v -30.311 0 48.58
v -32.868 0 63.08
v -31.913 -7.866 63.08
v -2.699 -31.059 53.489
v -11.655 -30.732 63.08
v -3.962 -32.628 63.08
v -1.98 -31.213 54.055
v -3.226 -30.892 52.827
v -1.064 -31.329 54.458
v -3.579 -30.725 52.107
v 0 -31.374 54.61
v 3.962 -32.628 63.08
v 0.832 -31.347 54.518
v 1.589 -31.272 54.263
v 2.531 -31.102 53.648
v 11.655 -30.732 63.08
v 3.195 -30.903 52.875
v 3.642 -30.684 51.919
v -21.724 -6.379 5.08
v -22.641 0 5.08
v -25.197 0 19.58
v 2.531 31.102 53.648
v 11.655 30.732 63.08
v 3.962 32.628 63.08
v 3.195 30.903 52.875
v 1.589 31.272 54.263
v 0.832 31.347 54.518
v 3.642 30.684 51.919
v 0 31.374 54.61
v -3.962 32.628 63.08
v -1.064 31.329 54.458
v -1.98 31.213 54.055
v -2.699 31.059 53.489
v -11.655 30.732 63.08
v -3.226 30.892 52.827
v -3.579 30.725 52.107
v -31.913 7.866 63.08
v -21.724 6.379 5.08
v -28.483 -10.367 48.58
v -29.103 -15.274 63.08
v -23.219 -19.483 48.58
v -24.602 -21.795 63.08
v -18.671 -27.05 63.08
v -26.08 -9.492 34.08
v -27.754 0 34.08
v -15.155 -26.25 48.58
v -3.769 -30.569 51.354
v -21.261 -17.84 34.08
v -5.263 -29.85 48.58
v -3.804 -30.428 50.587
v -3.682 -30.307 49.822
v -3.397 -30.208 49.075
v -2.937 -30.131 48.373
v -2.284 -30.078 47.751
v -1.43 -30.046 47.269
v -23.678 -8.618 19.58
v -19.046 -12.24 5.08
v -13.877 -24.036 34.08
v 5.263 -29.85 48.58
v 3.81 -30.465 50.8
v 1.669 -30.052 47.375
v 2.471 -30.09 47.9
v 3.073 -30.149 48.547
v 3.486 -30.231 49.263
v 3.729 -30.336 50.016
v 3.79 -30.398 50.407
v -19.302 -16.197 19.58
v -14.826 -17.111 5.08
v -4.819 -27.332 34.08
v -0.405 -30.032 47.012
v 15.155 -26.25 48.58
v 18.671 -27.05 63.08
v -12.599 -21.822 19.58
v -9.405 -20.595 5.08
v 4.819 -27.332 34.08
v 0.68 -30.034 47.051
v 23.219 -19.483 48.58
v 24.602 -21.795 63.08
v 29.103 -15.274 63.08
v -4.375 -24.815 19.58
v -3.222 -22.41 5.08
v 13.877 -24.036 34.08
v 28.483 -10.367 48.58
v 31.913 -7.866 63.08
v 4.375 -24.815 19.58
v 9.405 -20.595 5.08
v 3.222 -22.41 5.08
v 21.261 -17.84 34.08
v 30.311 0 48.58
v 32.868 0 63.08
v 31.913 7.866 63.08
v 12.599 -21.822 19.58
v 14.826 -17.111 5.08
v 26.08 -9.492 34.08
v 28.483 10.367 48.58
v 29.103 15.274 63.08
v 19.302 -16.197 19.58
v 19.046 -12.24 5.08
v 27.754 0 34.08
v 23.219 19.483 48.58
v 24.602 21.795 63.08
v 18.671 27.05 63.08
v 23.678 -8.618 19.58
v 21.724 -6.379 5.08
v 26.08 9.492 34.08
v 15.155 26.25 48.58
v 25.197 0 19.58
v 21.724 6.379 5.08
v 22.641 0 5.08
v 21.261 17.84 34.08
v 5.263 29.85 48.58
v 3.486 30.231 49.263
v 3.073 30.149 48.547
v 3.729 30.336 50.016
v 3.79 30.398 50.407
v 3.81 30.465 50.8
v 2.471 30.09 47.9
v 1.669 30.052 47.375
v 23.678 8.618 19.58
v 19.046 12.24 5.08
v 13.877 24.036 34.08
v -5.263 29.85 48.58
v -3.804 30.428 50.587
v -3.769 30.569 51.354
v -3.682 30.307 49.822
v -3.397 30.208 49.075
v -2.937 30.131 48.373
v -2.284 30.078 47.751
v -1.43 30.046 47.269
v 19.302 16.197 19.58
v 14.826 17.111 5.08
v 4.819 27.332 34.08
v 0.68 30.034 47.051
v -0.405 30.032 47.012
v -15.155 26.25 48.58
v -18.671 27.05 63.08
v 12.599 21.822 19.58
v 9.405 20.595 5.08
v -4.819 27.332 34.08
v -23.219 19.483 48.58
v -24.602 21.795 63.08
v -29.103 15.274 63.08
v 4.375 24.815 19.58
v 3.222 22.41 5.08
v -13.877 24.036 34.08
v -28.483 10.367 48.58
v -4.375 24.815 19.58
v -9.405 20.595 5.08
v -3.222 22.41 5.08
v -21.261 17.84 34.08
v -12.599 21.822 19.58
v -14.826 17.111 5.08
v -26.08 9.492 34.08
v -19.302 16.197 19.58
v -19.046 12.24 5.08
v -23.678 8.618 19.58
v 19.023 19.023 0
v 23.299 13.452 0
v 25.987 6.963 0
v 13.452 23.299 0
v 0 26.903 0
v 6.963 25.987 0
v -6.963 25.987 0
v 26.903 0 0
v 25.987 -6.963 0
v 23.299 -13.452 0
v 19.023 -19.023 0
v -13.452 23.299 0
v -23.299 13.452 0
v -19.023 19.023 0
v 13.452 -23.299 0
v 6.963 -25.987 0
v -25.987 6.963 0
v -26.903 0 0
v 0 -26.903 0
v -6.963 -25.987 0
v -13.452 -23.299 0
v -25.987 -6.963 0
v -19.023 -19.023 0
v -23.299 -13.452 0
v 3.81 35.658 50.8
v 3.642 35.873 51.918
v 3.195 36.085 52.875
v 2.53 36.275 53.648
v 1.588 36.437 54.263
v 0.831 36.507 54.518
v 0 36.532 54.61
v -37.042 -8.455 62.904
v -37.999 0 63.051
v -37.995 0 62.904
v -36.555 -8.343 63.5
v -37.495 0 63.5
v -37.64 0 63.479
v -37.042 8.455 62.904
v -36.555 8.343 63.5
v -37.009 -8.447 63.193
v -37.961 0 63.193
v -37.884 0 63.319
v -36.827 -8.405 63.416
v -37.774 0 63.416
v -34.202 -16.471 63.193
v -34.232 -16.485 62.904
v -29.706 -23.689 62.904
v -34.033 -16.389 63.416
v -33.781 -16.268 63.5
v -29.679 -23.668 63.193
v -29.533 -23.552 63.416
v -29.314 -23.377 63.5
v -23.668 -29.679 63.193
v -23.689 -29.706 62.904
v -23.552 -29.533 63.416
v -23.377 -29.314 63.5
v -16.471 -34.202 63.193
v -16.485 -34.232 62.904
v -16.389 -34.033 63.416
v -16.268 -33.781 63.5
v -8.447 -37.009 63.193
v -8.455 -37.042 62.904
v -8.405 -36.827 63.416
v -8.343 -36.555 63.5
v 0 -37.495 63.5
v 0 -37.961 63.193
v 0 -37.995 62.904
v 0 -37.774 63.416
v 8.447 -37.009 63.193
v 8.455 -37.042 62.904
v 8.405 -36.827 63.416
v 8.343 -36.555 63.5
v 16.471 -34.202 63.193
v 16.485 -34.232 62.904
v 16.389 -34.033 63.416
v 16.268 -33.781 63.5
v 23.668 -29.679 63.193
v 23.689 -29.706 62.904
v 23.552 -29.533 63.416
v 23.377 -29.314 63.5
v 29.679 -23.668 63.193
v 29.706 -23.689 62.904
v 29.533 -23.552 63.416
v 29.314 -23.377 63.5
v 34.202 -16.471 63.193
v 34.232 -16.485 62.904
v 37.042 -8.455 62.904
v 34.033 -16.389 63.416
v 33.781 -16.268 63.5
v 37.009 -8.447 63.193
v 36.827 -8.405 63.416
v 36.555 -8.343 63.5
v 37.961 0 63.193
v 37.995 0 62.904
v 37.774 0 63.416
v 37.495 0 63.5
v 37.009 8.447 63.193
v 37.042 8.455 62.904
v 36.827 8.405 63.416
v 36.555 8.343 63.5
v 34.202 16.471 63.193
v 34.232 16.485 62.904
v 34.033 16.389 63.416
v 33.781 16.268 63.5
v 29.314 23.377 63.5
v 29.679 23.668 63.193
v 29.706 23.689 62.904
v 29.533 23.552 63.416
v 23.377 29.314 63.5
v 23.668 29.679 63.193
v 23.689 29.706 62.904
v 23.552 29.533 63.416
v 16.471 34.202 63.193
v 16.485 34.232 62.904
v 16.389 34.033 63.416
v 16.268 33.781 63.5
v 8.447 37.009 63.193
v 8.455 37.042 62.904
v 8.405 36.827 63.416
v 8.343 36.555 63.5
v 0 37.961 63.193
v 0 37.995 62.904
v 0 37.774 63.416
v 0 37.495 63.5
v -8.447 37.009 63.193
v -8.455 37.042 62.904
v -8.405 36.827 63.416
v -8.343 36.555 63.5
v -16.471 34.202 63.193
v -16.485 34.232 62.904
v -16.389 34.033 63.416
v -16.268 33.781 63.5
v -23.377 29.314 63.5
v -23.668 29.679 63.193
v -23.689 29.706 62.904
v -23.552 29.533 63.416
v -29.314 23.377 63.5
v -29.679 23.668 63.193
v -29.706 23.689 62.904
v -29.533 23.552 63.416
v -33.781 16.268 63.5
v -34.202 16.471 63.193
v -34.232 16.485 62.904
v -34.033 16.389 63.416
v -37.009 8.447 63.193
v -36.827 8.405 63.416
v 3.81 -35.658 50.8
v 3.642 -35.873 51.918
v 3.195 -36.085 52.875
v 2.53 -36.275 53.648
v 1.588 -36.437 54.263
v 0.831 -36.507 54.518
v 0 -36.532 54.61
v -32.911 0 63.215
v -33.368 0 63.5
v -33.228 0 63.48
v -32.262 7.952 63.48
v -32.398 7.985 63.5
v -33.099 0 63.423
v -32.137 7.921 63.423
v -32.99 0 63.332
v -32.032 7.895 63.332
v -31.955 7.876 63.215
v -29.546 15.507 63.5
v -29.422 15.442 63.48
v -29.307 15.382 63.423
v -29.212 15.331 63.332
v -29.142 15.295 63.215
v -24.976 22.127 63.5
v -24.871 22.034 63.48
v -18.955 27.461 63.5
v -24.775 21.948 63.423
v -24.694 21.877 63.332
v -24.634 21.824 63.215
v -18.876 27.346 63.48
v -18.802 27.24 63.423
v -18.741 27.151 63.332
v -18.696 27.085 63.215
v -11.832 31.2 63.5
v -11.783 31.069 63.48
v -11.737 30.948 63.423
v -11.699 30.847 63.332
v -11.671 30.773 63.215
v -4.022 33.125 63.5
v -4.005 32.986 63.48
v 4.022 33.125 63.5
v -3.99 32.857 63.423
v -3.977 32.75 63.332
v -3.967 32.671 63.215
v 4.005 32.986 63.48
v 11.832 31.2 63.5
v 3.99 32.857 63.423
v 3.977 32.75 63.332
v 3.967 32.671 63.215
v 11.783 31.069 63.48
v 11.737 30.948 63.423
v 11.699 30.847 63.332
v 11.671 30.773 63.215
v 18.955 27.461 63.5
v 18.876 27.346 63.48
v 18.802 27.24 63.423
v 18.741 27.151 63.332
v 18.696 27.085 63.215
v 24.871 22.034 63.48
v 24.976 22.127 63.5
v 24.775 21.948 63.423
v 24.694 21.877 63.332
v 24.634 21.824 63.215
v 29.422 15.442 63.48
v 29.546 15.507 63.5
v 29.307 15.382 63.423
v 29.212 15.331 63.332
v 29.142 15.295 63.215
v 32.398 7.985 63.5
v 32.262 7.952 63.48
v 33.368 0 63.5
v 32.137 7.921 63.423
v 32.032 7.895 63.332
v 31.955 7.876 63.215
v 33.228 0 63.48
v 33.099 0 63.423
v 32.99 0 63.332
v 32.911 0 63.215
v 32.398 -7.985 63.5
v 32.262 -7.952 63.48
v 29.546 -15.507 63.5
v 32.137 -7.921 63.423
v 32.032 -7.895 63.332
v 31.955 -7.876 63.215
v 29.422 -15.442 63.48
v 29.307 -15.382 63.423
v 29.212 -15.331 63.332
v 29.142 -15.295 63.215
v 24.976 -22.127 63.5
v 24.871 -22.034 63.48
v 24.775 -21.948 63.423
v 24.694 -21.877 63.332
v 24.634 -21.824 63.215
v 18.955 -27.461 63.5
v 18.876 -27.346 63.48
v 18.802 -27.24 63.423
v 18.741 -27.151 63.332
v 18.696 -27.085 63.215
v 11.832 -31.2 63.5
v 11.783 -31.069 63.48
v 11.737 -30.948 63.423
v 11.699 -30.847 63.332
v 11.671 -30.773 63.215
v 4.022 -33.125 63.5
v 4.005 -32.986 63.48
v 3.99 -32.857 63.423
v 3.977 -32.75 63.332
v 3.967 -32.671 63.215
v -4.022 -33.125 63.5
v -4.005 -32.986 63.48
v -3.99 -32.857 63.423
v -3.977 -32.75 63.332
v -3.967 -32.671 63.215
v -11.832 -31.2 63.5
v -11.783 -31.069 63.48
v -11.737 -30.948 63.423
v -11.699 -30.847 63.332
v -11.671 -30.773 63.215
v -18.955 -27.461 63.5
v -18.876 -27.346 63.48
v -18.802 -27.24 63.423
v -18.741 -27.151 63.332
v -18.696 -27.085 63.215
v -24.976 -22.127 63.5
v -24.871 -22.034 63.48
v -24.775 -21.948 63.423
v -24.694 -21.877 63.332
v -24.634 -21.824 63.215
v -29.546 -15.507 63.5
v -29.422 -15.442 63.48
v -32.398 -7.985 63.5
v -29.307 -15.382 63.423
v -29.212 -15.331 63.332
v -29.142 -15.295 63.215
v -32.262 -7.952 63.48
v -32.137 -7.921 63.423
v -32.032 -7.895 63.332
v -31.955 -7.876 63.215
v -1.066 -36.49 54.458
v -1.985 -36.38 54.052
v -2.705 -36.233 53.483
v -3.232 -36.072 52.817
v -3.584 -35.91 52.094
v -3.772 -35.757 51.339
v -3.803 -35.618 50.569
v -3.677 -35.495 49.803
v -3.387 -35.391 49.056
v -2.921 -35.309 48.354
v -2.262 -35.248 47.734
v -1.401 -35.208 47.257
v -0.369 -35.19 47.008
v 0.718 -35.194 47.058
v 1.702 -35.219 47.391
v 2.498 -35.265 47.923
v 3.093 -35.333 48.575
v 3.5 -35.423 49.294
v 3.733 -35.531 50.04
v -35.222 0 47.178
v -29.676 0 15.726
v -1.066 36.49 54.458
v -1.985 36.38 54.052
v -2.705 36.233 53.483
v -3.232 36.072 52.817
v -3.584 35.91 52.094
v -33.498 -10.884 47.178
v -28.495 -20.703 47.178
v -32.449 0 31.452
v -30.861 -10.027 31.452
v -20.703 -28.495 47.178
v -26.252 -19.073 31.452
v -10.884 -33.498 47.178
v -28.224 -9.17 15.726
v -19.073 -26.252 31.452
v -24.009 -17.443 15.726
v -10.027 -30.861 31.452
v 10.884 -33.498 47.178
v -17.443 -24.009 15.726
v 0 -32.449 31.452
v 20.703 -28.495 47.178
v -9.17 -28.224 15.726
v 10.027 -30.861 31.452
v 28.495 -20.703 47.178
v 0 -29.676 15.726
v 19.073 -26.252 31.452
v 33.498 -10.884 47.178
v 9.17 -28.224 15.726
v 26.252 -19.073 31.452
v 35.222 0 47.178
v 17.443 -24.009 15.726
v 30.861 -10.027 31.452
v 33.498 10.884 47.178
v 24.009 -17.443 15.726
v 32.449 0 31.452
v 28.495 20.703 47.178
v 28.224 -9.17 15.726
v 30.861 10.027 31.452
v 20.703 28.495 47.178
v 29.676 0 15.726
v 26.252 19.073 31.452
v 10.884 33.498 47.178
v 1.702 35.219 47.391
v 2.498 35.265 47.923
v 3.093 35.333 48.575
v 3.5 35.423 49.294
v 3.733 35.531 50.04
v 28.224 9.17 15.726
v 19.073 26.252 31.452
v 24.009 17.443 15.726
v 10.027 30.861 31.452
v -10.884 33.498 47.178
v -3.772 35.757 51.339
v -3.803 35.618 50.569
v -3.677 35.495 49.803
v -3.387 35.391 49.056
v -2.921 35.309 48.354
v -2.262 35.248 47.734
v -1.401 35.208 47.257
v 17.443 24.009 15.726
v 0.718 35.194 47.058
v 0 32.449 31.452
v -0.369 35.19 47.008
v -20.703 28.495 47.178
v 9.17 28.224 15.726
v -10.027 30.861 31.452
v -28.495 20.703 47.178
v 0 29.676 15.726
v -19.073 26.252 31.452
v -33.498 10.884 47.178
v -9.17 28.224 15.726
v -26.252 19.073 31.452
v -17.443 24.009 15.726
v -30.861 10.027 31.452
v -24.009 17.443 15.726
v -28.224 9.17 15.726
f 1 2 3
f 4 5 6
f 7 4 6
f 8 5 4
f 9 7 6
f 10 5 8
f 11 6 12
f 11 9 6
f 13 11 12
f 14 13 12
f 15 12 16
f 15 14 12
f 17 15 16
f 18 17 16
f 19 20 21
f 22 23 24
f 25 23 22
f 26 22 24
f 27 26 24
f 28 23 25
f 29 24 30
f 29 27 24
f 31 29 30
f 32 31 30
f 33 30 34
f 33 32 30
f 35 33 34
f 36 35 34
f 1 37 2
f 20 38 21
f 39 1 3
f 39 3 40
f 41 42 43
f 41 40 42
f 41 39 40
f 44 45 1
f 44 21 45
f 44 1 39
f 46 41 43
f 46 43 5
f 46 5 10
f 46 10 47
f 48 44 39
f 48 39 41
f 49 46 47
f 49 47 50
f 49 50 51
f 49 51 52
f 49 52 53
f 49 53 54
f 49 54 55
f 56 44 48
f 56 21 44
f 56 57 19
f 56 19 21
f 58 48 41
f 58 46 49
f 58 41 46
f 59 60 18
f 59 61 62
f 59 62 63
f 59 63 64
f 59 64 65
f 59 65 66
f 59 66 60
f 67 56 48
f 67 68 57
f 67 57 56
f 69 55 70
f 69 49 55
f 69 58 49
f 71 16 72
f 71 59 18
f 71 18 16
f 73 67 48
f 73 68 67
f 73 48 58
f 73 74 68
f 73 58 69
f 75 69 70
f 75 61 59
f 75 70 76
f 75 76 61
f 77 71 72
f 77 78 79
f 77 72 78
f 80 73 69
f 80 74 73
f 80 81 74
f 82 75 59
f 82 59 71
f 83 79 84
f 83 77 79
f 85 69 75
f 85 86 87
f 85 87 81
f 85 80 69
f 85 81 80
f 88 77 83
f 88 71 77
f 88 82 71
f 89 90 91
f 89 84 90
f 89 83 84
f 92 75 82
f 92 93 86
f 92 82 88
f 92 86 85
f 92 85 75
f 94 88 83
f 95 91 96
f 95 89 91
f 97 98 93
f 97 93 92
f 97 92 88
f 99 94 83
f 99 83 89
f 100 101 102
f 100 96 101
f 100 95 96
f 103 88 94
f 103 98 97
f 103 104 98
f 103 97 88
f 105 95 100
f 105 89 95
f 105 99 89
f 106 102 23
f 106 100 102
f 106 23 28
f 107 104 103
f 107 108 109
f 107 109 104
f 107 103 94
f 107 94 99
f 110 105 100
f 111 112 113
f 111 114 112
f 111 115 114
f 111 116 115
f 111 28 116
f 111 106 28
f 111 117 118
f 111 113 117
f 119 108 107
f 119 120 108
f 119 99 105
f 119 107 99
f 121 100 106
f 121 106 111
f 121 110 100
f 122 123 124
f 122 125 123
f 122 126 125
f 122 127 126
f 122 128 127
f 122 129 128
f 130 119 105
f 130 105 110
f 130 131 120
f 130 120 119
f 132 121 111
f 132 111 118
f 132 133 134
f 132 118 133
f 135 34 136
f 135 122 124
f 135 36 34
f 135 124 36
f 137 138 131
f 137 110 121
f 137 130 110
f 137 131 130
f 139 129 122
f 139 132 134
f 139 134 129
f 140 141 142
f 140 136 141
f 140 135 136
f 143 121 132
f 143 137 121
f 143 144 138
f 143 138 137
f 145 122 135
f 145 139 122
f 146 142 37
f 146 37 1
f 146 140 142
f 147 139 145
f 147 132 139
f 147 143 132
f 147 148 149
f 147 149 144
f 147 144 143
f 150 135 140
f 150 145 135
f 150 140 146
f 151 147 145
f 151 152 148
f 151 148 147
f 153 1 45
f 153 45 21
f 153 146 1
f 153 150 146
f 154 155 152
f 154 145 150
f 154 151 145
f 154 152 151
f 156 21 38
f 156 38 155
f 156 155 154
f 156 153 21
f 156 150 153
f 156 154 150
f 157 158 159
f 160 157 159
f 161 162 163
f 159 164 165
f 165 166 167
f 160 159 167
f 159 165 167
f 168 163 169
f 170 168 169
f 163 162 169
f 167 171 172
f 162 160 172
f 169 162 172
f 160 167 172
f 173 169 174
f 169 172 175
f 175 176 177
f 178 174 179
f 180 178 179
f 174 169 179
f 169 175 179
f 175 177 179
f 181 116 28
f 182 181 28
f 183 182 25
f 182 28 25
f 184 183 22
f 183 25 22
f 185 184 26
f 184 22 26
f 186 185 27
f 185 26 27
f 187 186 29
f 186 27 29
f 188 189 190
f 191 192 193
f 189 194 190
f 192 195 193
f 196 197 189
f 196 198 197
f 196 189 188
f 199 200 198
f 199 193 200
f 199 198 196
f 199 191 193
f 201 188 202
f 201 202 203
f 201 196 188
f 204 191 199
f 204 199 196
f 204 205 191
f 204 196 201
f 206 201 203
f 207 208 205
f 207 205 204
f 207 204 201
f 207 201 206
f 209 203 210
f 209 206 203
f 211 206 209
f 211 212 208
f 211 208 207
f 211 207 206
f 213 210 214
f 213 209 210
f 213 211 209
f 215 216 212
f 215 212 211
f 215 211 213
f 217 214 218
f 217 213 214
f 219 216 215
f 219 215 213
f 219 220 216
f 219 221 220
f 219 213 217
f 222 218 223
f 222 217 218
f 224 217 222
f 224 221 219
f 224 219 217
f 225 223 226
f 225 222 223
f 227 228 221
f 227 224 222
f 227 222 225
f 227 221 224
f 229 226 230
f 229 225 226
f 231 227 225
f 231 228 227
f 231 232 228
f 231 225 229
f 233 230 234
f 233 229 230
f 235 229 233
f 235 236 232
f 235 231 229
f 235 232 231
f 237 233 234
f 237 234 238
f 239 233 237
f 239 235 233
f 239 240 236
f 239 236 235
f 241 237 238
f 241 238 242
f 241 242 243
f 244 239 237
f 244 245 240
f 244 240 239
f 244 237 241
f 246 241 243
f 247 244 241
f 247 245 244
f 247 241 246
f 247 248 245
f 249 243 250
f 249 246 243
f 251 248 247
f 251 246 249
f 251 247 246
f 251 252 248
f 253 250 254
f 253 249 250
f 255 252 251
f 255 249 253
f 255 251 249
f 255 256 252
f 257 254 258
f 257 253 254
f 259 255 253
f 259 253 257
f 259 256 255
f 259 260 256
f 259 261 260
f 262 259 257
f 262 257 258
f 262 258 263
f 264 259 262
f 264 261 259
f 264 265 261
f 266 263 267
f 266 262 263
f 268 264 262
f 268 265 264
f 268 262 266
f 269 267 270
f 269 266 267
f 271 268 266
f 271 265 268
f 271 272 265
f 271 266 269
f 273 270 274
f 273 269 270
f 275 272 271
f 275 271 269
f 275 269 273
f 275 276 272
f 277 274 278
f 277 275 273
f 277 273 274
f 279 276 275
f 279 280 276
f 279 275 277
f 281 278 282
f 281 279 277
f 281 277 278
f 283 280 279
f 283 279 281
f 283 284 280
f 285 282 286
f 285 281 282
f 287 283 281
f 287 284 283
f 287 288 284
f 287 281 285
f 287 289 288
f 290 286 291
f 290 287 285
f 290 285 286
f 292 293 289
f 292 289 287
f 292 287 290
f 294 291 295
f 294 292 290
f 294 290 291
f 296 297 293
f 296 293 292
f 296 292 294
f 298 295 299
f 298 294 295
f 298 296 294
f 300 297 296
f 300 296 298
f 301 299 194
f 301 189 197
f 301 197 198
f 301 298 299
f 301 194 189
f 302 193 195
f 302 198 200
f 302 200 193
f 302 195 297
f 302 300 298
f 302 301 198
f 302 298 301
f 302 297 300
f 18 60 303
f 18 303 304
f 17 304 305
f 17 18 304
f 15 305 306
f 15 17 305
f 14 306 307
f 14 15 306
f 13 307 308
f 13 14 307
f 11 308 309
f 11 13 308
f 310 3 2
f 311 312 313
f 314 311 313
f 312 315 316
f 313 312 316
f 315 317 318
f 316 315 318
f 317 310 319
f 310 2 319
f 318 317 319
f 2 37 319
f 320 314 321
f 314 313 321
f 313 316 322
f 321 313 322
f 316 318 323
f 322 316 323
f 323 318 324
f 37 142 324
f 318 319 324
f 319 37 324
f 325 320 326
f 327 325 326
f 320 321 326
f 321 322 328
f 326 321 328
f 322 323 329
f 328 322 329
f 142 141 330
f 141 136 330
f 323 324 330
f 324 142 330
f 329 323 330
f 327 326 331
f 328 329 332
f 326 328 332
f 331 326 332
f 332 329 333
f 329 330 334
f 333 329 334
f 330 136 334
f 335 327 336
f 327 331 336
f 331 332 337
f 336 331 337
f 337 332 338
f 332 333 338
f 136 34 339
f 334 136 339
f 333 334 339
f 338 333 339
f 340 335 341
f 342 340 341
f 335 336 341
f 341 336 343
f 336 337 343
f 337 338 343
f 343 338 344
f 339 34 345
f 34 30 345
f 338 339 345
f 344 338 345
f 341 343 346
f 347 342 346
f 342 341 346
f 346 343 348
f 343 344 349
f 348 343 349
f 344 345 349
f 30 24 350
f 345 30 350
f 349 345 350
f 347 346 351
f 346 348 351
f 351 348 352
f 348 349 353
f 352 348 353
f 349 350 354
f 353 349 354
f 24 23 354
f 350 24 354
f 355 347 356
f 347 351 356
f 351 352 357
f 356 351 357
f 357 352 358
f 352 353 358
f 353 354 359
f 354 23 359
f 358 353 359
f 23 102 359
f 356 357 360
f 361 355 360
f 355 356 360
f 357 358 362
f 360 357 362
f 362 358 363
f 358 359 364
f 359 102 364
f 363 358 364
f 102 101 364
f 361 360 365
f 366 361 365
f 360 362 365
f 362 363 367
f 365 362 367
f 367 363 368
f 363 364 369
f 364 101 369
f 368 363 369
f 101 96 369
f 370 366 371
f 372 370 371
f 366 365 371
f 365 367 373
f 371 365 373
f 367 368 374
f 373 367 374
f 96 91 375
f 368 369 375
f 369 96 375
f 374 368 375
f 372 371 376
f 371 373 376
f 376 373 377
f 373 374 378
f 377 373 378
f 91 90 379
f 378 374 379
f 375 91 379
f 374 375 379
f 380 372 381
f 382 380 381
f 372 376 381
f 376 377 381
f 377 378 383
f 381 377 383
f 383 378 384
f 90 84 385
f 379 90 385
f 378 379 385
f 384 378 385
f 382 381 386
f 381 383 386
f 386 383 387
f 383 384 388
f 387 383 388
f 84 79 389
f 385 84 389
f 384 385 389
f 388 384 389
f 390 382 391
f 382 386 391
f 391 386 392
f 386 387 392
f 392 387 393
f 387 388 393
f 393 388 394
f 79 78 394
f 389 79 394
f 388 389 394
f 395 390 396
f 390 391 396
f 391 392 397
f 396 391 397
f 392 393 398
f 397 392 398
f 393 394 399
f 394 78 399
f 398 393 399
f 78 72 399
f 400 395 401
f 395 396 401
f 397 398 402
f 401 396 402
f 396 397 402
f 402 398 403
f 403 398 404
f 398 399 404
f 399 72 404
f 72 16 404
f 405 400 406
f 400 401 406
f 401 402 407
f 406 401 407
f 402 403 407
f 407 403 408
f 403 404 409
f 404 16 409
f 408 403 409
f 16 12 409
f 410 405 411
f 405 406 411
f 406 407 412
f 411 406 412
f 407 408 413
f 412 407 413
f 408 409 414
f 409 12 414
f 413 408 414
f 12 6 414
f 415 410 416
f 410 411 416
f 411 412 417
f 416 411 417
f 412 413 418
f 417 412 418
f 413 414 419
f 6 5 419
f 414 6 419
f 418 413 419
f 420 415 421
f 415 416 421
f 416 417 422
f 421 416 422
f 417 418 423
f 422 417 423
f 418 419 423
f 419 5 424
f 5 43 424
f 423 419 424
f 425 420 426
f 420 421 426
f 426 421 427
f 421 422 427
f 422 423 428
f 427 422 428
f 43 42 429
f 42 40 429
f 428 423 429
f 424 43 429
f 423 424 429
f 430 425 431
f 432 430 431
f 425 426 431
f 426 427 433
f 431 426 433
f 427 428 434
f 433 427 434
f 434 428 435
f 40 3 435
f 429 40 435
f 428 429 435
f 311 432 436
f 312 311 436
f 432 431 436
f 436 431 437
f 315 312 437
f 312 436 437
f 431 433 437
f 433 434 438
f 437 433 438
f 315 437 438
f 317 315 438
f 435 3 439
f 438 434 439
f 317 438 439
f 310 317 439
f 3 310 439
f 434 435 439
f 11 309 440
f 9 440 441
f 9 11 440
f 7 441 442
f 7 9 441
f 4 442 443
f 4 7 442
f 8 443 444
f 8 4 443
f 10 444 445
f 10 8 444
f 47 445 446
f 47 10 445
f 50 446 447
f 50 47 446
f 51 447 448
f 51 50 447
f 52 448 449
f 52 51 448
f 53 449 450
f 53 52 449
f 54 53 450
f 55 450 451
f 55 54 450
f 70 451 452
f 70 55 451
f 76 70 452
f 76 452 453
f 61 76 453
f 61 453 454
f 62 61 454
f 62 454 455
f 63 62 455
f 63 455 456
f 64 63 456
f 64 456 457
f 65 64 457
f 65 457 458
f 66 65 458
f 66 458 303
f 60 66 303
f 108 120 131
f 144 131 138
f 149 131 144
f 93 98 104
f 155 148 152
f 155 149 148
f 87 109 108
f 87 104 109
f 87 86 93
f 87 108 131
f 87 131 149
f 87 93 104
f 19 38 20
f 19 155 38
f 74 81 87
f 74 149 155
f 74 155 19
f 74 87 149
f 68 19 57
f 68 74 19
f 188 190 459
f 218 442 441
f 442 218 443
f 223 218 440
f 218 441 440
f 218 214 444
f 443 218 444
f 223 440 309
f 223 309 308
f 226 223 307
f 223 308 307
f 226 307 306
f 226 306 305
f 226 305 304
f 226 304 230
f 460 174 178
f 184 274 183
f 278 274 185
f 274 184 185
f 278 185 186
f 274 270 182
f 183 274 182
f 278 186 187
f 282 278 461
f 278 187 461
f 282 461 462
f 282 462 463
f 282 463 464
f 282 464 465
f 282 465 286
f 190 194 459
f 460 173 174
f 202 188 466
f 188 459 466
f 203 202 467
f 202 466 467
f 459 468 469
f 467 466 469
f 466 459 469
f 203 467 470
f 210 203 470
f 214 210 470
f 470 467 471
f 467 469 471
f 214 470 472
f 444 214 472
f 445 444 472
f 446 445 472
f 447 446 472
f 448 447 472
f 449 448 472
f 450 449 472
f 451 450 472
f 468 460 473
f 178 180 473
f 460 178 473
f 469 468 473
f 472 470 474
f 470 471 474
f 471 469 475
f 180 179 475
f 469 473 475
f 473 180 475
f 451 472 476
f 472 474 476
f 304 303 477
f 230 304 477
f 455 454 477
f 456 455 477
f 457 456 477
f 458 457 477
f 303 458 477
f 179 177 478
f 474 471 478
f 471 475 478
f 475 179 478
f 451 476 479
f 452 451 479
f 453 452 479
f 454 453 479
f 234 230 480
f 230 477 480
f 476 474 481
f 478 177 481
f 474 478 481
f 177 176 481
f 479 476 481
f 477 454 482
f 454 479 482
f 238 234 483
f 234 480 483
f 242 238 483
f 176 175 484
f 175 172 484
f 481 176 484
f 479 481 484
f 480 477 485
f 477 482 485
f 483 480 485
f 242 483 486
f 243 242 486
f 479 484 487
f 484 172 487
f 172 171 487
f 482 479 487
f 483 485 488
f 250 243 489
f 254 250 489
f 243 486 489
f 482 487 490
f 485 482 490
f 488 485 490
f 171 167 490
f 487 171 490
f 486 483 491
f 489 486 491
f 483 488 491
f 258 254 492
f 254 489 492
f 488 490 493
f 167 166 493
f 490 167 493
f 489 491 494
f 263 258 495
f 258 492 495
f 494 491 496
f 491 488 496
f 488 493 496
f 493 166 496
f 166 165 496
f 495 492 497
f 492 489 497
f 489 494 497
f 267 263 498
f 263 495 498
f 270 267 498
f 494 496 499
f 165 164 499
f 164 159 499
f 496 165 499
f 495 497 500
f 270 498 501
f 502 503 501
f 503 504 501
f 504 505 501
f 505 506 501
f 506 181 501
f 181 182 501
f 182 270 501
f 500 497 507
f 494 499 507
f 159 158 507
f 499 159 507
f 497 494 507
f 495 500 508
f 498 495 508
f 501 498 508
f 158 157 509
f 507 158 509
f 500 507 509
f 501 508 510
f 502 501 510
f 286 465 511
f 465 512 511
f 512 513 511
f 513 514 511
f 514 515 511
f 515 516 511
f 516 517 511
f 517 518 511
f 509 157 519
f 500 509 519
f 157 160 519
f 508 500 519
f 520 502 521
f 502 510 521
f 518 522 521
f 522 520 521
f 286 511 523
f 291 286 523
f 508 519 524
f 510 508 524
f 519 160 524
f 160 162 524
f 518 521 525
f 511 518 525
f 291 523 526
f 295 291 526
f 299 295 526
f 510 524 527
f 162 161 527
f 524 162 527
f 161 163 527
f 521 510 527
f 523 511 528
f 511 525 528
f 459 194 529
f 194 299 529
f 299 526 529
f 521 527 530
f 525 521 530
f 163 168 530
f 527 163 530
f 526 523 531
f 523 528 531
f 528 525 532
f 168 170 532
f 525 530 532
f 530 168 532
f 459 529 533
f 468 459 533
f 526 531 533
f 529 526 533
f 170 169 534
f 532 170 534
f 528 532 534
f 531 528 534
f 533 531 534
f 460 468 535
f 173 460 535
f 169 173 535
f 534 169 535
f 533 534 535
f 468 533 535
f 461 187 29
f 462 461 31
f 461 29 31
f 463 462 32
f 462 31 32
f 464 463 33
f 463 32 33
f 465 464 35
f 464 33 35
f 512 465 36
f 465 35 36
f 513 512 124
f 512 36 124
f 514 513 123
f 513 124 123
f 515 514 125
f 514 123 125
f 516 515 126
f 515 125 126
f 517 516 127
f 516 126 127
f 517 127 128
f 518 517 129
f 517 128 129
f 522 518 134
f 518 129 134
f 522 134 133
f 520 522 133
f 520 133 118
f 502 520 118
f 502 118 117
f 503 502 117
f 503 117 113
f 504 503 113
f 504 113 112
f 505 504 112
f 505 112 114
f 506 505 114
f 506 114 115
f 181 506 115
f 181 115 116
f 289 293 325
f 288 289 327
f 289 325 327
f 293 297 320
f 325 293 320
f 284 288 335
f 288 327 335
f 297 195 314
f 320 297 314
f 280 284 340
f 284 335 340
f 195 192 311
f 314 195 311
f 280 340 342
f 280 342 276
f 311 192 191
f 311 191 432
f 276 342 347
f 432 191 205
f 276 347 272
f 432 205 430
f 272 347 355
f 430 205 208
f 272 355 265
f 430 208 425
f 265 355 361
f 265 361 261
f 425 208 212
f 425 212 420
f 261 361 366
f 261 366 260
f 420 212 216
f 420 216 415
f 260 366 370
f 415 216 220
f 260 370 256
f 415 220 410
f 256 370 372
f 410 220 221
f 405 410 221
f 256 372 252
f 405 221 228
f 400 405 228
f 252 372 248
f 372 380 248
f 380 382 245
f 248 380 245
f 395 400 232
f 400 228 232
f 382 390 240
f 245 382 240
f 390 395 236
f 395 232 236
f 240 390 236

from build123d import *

# Parameters (mm, degrees)
F2_T     = -5.08
F4_DEPTH = 38.101
F5_DEPTH = 38.1010001
F6_R     = 0.508


with BuildPart() as f1:
    # F0 (on Front) → F1 (revolve)
    with BuildSketch(Plane.XZ):
        Polygon((0, 0), (0, 63.5), (-38.1, 63.5), (-26.903236725, 0), align=None)
    revolve(axis=Axis((0, 0, 31.75), (0, 0, 1)))

    # F2
    f2_openings = [f1.faces().sort_by_distance(p)[0] for p in [
        (0, 0, 63.5),
    ]]
    offset(amount=F2_T, openings=f2_openings)

    # F3 (on Front) → F4 (cut, through all)
    with BuildSketch(Plane.XZ):
        with BuildLine():
            ThreePointArc((0, 54.61), (-2.6940768363, 48.1059231637), (3.81, 50.8))
            ThreePointArc((3.81, 50.8), (2.6940768363, 53.4940768363), (0, 54.61))
        make_face()
    extrude(amount=F4_DEPTH, mode=Mode.SUBTRACT)

    # F3 (on Front) → F5 (cut, through all)
    with BuildSketch(Plane.XZ):
        with BuildLine():
            ThreePointArc((0, 54.61), (-2.6940768363, 48.1059231637), (3.81, 50.8))
            ThreePointArc((3.81, 50.8), (2.6940768363, 53.4940768363), (0, 54.61))
        make_face()
    extrude(amount=-F5_DEPTH, mode=Mode.SUBTRACT)

    # F6
    f6_edges = [f1.edges().sort_by_distance(p)[0] for p in [
        (38.1, 0, 63.5),
        (32.941633, 0, 63.5),
    ]]
    fillet(f6_edges, radius=F6_R)


solid = f1.part
